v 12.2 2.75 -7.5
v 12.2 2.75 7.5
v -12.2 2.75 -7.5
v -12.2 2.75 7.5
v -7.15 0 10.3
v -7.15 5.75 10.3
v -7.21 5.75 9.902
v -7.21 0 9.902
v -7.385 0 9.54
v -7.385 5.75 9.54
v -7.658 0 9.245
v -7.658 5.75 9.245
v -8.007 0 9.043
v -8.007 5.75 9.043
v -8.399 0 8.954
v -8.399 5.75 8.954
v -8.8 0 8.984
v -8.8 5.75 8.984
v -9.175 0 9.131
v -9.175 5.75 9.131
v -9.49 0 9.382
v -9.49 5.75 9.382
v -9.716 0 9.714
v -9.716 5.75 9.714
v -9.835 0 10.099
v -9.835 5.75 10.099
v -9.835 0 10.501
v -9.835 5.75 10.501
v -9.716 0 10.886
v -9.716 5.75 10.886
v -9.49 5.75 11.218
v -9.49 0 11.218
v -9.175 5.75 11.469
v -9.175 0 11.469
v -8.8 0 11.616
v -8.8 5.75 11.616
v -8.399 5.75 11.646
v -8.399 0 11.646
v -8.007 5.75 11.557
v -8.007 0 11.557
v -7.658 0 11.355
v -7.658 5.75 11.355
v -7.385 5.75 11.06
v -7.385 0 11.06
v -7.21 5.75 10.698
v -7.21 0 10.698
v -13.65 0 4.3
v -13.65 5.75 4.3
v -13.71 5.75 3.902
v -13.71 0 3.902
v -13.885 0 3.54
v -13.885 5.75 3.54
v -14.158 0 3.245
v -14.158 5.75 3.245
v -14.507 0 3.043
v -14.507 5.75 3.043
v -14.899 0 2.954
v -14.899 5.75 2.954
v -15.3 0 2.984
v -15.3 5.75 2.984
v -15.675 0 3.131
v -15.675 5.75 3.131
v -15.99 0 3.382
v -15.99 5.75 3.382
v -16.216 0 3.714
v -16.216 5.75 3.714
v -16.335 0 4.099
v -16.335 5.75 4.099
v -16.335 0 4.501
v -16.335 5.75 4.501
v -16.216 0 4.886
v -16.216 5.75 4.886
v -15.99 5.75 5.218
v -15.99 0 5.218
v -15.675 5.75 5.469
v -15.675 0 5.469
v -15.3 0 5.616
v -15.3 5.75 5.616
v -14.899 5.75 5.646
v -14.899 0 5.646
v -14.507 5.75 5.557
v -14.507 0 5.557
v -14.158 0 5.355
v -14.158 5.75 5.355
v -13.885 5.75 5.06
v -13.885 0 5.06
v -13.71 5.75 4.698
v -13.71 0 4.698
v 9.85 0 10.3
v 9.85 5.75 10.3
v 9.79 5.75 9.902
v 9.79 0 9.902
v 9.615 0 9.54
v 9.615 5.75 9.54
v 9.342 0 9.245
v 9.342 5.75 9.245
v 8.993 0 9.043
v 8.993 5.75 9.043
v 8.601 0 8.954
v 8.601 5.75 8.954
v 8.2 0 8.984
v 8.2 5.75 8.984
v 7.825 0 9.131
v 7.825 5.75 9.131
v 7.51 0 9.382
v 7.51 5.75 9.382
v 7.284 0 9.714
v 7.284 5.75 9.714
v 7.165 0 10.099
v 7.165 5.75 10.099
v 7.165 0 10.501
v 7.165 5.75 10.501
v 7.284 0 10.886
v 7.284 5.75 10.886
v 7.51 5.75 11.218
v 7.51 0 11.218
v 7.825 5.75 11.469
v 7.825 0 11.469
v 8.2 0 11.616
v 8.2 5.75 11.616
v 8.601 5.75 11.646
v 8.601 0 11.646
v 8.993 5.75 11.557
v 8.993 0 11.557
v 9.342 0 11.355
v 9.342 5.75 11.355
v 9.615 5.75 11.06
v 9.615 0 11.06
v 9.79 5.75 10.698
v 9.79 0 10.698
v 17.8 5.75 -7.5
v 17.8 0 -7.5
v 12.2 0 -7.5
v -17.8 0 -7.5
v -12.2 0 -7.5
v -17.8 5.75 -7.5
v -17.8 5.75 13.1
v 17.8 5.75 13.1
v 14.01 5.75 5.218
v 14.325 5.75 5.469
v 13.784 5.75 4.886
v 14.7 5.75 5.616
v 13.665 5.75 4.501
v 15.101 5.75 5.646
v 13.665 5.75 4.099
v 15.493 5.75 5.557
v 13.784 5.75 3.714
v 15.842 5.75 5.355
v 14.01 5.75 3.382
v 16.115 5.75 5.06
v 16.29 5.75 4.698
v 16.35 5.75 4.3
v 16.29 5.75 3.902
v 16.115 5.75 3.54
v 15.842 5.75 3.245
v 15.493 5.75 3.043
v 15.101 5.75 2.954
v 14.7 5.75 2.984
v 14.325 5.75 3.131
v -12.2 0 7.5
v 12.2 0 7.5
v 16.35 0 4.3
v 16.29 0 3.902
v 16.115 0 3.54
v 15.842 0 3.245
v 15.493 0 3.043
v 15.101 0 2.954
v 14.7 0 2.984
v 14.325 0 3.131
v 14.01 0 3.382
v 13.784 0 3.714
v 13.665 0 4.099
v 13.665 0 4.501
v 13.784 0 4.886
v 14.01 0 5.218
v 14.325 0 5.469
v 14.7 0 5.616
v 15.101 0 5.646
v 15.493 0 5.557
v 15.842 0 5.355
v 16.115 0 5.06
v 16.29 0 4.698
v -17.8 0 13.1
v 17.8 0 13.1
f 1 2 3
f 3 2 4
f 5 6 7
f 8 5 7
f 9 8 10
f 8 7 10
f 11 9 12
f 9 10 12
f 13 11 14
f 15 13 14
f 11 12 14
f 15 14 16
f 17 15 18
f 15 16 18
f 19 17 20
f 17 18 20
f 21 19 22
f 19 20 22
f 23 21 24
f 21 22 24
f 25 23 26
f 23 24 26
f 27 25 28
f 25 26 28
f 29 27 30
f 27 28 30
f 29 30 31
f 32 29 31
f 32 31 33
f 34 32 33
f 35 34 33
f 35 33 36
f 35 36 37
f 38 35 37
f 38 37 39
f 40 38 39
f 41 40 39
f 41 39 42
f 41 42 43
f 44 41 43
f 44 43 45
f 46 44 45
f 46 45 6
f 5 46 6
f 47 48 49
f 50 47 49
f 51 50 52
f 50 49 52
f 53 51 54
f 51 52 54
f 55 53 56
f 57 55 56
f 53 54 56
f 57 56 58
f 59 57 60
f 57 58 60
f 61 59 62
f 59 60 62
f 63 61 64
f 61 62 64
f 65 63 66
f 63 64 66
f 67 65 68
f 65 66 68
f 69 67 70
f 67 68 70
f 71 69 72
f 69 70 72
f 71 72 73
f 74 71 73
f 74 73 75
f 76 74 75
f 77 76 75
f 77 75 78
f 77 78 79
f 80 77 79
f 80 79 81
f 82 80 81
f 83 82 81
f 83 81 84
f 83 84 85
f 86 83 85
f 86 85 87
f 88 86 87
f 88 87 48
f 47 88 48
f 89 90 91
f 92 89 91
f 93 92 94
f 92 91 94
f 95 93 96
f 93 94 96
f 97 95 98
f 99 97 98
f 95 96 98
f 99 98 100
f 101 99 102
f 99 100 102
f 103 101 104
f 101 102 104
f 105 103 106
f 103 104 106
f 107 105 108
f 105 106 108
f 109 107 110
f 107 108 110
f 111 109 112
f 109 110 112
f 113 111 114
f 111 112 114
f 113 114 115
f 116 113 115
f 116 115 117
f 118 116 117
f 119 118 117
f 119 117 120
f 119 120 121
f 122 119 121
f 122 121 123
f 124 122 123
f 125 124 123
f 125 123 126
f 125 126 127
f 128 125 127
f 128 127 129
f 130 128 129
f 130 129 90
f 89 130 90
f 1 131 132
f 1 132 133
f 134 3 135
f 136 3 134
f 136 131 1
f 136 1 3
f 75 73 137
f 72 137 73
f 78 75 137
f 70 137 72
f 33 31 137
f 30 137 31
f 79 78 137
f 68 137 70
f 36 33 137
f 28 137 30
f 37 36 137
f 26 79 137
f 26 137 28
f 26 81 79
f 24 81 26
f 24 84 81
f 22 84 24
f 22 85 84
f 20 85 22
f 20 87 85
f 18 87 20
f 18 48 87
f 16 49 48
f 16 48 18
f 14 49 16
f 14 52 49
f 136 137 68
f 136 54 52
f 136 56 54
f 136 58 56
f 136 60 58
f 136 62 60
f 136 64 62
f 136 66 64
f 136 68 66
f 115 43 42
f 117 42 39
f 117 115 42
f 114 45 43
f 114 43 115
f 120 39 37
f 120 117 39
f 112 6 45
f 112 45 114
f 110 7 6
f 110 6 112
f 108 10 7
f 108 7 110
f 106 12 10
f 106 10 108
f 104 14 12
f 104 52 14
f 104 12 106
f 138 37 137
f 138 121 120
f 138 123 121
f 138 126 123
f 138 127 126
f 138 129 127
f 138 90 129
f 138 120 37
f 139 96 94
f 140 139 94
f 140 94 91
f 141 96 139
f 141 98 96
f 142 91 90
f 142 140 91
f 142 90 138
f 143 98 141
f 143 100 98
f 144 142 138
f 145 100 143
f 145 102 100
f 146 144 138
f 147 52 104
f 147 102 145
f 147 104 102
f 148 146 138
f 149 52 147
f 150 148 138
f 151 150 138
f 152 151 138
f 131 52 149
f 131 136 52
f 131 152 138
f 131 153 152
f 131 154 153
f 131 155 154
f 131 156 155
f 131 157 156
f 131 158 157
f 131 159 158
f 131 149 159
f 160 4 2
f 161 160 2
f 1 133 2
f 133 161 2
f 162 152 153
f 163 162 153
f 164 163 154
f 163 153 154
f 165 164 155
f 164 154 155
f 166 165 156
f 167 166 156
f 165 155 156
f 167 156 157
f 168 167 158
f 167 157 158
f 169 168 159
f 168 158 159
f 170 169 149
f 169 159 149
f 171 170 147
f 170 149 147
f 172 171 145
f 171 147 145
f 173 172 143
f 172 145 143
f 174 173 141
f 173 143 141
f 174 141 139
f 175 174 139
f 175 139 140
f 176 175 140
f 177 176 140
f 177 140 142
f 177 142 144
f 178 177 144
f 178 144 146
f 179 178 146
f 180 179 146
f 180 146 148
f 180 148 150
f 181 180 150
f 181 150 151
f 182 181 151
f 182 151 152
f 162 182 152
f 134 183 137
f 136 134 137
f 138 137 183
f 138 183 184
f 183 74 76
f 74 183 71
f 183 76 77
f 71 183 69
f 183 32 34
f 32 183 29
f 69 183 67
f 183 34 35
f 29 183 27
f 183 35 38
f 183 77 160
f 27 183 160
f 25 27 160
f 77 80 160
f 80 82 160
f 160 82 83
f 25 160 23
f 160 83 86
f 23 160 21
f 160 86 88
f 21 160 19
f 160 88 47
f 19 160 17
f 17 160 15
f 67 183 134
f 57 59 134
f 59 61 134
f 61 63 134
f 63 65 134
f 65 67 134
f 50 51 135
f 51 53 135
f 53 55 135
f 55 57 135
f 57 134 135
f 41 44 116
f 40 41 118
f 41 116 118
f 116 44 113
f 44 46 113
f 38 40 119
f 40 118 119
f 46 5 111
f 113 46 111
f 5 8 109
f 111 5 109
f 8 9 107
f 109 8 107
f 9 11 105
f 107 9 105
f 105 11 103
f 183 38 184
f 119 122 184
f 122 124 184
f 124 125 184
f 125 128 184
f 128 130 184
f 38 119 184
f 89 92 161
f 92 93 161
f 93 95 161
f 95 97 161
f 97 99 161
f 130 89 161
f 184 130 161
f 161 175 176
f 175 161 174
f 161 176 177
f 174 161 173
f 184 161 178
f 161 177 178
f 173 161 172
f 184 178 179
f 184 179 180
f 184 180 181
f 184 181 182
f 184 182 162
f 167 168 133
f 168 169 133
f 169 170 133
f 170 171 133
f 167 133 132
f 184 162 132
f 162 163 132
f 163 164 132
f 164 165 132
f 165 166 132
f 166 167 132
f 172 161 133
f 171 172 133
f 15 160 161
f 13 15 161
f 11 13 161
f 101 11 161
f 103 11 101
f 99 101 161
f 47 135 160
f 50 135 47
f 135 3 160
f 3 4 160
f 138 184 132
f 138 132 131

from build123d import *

# Parameters (mm, degrees)
BOSS_EXTRUDE1_DEPTH = 7.5
SKETCH8_W           = 35.6
SKETCH8_H           = 5.75
BOSS_EXTRUDE4_DEPTH = 5.6
SKETCH9_R           = 1.35
CUT_EXTRUDE3_DEPTH  = 6.75


with BuildPart() as part:
    # Sketch1 → Boss-Extrude1 (new body, symmetric)
    with BuildSketch(Plane.XY):
        Polygon((-17.8, 5.75), (17.8, 5.75), (17.8, 0), (12.2, 0), (12.2, 2.75), (-12.2, 2.75), (-12.2, 0), (-17.8, 0), align=None)
    extrude(amount=BOSS_EXTRUDE1_DEPTH, both=True)

    # Sketch8 → Boss-Extrude4 (add)
    with BuildSketch(Plane.XY.offset(7.5)):
        with Locations((0, 2.875)):
            Rectangle(SKETCH8_W, SKETCH8_H)
    extrude(amount=BOSS_EXTRUDE4_DEPTH)

    # Sketch9 → Cut-Extrude3 (cut, through all)
    with BuildSketch(Plane(origin=(0, 5.75, 0), x_dir=(1, 0, 0), z_dir=(0, 1, 0))):
        with Locations((-8.5, -10.3)):
            Circle(SKETCH9_R)
        with Locations((-15, -4.3)):
            Circle(SKETCH9_R)
        with Locations((8.5, -10.3)):
            Circle(SKETCH9_R)
        with Locations((15, -4.3)):
            Circle(SKETCH9_R)
    extrude(amount=-CUT_EXTRUDE3_DEPTH, mode=Mode.SUBTRACT)


solid = part.part
